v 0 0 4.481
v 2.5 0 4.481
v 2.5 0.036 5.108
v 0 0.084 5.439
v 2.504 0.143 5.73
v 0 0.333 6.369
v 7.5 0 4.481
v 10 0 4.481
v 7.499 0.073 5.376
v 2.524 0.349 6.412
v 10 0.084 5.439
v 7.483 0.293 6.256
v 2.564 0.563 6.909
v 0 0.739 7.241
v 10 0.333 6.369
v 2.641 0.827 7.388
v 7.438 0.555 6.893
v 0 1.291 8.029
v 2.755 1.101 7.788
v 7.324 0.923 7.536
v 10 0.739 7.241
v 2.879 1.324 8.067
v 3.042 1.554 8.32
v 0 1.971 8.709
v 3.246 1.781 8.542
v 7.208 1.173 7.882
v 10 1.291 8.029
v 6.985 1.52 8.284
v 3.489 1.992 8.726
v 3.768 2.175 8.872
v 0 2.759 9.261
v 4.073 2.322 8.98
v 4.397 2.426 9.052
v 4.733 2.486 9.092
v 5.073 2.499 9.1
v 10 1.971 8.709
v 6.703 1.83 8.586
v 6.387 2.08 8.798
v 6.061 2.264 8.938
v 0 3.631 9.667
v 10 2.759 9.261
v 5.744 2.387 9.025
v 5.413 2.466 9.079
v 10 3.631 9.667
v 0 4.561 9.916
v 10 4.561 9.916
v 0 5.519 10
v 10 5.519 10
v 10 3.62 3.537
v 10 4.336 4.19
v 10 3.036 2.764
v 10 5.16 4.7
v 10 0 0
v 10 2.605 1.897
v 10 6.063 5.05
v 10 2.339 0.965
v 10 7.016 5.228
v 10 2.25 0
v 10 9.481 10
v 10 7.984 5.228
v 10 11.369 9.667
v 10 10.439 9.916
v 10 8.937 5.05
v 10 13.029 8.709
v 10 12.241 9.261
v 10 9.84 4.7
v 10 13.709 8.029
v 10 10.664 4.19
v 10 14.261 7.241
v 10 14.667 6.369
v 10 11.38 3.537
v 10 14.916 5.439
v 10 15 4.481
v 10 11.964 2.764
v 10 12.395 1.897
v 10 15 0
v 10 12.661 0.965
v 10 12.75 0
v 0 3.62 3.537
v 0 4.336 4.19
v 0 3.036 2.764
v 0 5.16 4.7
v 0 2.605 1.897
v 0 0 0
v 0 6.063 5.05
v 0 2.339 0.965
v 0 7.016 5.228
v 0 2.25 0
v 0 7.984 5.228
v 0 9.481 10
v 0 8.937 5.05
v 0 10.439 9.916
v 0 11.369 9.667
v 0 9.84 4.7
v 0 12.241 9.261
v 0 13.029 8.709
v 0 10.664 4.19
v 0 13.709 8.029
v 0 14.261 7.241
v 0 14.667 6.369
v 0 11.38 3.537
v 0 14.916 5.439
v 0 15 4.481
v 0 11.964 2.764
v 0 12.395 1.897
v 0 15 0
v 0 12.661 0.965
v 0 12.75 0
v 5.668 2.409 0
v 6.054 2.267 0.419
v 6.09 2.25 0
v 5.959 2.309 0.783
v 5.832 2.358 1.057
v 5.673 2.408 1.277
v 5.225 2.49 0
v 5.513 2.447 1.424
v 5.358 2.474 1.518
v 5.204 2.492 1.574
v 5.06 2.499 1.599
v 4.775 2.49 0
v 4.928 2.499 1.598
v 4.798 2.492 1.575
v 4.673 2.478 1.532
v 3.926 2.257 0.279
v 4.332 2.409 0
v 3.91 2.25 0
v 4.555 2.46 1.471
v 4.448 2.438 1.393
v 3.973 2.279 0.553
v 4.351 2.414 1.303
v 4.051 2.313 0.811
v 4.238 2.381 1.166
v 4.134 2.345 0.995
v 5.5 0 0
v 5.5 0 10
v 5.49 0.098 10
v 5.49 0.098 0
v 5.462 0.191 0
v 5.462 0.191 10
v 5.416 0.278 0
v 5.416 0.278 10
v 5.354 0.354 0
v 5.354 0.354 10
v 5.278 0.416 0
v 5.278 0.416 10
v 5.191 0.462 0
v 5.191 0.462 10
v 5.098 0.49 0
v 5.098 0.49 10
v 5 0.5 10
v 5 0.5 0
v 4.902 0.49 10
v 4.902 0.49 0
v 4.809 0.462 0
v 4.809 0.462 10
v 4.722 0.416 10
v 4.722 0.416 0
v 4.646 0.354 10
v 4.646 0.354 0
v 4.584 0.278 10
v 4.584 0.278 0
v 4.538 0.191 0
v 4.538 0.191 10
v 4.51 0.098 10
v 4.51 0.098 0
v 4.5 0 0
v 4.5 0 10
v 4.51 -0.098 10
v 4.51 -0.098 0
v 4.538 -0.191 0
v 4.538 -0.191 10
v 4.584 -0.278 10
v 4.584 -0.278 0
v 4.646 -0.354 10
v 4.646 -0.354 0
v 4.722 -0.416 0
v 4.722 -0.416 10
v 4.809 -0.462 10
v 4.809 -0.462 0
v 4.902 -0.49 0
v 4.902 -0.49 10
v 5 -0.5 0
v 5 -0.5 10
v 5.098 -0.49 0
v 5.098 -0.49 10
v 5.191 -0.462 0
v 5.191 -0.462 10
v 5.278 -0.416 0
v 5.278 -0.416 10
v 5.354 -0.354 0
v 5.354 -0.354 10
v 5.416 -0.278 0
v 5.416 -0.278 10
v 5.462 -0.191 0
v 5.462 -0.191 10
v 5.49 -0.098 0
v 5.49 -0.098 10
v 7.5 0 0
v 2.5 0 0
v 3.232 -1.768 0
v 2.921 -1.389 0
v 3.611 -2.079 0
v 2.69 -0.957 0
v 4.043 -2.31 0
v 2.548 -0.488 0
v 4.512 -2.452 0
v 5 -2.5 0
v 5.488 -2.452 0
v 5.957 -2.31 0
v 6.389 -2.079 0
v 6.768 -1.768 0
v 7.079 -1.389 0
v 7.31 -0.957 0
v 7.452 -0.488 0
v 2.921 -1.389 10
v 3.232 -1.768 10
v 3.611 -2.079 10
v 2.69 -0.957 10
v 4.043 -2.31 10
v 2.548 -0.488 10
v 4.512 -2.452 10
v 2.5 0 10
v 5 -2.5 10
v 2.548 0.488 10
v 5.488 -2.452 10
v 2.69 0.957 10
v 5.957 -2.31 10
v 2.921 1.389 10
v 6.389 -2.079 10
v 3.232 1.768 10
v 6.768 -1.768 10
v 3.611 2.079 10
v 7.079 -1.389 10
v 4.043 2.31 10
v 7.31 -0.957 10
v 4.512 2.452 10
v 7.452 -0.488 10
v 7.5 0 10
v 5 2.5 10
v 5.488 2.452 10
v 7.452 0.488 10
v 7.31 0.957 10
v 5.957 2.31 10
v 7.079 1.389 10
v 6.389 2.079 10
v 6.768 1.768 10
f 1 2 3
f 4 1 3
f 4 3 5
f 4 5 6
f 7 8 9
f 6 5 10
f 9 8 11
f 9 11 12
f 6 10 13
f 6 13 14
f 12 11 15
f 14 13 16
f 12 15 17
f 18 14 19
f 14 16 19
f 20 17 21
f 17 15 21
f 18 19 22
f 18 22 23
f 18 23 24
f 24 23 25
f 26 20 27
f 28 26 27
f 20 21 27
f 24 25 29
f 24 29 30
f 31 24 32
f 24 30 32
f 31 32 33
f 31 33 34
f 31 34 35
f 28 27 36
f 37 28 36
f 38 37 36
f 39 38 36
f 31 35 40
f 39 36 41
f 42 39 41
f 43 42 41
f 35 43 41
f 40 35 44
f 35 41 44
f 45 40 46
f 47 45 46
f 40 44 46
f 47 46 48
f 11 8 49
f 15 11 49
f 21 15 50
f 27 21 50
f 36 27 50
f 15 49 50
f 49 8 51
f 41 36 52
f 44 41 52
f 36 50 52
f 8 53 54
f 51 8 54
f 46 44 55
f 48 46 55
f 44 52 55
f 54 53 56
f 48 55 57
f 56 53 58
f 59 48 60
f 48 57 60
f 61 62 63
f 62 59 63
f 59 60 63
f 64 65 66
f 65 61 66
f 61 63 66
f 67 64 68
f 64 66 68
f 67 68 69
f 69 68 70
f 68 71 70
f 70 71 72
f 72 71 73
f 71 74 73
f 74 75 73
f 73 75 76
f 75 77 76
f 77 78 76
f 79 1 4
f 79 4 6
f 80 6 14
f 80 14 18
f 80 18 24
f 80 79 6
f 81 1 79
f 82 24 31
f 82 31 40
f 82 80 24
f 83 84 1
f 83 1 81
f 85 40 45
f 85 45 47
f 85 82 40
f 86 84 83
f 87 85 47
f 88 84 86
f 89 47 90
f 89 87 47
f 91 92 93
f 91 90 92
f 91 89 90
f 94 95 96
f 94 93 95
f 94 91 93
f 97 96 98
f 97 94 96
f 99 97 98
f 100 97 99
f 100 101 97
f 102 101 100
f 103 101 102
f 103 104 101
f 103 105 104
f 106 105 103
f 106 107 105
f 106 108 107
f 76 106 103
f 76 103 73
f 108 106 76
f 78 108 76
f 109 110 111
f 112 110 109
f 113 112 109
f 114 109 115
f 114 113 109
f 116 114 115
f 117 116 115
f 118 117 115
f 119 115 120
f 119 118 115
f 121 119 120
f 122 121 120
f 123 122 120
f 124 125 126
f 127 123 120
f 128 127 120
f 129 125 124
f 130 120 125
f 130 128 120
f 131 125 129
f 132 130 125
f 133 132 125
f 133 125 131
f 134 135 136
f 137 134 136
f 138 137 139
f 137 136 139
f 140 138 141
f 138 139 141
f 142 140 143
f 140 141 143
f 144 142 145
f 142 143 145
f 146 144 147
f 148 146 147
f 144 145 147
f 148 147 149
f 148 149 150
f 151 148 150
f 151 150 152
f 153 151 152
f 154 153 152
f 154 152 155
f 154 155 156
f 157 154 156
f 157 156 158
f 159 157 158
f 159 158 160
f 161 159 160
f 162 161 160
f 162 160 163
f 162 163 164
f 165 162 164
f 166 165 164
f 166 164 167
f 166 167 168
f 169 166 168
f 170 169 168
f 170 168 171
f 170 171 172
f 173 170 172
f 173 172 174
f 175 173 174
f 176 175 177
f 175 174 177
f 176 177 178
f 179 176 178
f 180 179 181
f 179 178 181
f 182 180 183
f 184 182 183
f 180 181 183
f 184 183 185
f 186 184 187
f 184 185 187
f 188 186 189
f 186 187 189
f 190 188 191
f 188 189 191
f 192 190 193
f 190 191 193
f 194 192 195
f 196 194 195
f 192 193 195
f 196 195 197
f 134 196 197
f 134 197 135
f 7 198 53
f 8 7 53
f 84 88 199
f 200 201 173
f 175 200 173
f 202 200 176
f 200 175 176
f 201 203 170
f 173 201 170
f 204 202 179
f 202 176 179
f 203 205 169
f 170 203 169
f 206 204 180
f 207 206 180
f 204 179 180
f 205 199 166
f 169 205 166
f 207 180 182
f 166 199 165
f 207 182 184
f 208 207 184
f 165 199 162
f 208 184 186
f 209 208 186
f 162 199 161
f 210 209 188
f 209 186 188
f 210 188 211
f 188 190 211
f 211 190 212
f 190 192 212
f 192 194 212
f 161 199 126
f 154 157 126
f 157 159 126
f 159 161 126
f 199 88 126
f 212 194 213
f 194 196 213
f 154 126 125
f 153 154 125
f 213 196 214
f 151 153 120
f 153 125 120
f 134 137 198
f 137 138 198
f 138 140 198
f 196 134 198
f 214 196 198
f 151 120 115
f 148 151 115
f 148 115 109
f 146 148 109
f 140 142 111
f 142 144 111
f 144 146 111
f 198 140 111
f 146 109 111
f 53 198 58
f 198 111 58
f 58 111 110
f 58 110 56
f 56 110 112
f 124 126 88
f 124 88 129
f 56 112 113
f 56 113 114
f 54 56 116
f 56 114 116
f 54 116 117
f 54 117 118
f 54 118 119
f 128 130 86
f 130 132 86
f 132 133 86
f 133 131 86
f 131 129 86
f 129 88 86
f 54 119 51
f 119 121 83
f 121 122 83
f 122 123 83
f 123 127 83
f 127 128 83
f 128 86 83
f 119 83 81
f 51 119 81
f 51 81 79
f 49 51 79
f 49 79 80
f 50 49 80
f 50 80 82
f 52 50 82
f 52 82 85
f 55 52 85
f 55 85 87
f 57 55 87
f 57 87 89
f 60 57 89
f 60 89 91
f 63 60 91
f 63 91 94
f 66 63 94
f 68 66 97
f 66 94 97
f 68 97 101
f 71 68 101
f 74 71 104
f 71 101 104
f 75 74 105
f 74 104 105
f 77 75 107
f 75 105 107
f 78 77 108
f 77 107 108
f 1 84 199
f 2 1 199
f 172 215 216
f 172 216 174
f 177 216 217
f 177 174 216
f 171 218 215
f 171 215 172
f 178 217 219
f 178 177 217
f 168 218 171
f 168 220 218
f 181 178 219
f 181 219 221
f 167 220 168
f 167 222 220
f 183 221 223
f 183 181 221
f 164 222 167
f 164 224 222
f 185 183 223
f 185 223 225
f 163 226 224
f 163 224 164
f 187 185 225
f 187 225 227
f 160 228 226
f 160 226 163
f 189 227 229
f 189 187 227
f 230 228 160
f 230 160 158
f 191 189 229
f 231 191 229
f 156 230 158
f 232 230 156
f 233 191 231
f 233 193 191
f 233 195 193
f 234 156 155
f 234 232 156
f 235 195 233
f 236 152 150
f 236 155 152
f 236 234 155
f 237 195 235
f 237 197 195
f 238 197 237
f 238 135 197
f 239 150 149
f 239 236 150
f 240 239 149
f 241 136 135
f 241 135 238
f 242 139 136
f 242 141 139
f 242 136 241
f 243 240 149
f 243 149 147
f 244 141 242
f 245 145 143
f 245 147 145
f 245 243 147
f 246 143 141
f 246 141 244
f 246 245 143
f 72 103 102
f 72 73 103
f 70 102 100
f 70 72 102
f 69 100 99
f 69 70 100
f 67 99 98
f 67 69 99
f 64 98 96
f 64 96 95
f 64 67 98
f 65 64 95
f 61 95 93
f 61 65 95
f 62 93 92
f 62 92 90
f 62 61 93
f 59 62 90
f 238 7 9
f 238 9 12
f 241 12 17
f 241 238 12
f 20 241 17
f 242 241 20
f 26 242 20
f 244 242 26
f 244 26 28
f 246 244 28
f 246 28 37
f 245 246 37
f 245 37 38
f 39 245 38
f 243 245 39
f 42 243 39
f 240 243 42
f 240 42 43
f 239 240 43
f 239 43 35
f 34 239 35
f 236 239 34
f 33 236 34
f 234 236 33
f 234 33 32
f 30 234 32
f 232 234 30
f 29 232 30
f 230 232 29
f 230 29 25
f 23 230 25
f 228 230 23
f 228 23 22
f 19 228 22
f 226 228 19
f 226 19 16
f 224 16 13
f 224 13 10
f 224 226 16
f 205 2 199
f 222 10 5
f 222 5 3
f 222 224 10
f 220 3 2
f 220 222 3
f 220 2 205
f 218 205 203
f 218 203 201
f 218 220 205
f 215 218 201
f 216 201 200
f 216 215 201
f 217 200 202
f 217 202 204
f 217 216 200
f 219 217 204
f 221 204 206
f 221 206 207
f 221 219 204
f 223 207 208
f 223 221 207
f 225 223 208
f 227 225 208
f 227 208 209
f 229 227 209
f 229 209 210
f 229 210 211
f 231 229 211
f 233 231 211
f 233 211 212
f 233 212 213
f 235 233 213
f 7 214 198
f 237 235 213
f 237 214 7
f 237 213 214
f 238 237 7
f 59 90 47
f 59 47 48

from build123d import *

# Parameters (mm, degrees)
F0_W     = 10
F0_H     = 15
F1_DEPTH = 7.5
F3_DEPTH = 10.001
F4_W     = 10
F4_H     = 15
F5_DEPTH = 2.5
F6_R     = 5.518892
F7_R     = 0.5
F8_DEPTH = 10.001
F7_R_2   = 2.5
F9_DEPTH = 10


with BuildPart() as f1:
    # F0 (on Top) → F1 (new body)
    with BuildSketch(Plane.XY):
        with Locations((5, 7.5)):
            Rectangle(F0_W, F0_H)
    extrude(amount=F1_DEPTH)

    # F2 (on face) → F3 (cut, through all)
    with BuildSketch(Plane(origin=(0, 0, 0), x_dir=(0, -1, 0), z_dir=(-1, 0, 0))):
        with BuildLine():
            Line((-12.75, 0), (-2.25, 0))
            ThreePointArc((-2.25, 0), (-7.5, 5.25), (-12.75, 0))
        make_face()
    extrude(amount=-F3_DEPTH, mode=Mode.SUBTRACT)

    # F4 (on face) → F5 (join)
    with BuildSketch(Plane.XY.offset(7.5)):
        with Locations((5, 7.5)):
            Rectangle(F4_W, F4_H)
    extrude(amount=F5_DEPTH)

    # F6
    f6_edges = [f1.edges().sort_by_distance(p)[0] for p in [
        (5, 15, 10),
        (5, 0, 10),
    ]]
    fillet(f6_edges, radius=F6_R)

    # F7 (on face) → F8 (cut, through all)
    with BuildSketch(Plane.XY.offset(10)):
        with Locations((5, 0)):
            Circle(F7_R)
    extrude(amount=-F8_DEPTH, mode=Mode.SUBTRACT)

    # F7 (on face) → F9 (join)
    with BuildSketch(Plane.XY.offset(10)):
        with Locations((5, 0)):
            Circle(F7_R_2)
        with Locations((5, 0)):
            Circle(F7_R, mode=Mode.SUBTRACT)
    extrude(amount=-F9_DEPTH)


solid = f1.part
